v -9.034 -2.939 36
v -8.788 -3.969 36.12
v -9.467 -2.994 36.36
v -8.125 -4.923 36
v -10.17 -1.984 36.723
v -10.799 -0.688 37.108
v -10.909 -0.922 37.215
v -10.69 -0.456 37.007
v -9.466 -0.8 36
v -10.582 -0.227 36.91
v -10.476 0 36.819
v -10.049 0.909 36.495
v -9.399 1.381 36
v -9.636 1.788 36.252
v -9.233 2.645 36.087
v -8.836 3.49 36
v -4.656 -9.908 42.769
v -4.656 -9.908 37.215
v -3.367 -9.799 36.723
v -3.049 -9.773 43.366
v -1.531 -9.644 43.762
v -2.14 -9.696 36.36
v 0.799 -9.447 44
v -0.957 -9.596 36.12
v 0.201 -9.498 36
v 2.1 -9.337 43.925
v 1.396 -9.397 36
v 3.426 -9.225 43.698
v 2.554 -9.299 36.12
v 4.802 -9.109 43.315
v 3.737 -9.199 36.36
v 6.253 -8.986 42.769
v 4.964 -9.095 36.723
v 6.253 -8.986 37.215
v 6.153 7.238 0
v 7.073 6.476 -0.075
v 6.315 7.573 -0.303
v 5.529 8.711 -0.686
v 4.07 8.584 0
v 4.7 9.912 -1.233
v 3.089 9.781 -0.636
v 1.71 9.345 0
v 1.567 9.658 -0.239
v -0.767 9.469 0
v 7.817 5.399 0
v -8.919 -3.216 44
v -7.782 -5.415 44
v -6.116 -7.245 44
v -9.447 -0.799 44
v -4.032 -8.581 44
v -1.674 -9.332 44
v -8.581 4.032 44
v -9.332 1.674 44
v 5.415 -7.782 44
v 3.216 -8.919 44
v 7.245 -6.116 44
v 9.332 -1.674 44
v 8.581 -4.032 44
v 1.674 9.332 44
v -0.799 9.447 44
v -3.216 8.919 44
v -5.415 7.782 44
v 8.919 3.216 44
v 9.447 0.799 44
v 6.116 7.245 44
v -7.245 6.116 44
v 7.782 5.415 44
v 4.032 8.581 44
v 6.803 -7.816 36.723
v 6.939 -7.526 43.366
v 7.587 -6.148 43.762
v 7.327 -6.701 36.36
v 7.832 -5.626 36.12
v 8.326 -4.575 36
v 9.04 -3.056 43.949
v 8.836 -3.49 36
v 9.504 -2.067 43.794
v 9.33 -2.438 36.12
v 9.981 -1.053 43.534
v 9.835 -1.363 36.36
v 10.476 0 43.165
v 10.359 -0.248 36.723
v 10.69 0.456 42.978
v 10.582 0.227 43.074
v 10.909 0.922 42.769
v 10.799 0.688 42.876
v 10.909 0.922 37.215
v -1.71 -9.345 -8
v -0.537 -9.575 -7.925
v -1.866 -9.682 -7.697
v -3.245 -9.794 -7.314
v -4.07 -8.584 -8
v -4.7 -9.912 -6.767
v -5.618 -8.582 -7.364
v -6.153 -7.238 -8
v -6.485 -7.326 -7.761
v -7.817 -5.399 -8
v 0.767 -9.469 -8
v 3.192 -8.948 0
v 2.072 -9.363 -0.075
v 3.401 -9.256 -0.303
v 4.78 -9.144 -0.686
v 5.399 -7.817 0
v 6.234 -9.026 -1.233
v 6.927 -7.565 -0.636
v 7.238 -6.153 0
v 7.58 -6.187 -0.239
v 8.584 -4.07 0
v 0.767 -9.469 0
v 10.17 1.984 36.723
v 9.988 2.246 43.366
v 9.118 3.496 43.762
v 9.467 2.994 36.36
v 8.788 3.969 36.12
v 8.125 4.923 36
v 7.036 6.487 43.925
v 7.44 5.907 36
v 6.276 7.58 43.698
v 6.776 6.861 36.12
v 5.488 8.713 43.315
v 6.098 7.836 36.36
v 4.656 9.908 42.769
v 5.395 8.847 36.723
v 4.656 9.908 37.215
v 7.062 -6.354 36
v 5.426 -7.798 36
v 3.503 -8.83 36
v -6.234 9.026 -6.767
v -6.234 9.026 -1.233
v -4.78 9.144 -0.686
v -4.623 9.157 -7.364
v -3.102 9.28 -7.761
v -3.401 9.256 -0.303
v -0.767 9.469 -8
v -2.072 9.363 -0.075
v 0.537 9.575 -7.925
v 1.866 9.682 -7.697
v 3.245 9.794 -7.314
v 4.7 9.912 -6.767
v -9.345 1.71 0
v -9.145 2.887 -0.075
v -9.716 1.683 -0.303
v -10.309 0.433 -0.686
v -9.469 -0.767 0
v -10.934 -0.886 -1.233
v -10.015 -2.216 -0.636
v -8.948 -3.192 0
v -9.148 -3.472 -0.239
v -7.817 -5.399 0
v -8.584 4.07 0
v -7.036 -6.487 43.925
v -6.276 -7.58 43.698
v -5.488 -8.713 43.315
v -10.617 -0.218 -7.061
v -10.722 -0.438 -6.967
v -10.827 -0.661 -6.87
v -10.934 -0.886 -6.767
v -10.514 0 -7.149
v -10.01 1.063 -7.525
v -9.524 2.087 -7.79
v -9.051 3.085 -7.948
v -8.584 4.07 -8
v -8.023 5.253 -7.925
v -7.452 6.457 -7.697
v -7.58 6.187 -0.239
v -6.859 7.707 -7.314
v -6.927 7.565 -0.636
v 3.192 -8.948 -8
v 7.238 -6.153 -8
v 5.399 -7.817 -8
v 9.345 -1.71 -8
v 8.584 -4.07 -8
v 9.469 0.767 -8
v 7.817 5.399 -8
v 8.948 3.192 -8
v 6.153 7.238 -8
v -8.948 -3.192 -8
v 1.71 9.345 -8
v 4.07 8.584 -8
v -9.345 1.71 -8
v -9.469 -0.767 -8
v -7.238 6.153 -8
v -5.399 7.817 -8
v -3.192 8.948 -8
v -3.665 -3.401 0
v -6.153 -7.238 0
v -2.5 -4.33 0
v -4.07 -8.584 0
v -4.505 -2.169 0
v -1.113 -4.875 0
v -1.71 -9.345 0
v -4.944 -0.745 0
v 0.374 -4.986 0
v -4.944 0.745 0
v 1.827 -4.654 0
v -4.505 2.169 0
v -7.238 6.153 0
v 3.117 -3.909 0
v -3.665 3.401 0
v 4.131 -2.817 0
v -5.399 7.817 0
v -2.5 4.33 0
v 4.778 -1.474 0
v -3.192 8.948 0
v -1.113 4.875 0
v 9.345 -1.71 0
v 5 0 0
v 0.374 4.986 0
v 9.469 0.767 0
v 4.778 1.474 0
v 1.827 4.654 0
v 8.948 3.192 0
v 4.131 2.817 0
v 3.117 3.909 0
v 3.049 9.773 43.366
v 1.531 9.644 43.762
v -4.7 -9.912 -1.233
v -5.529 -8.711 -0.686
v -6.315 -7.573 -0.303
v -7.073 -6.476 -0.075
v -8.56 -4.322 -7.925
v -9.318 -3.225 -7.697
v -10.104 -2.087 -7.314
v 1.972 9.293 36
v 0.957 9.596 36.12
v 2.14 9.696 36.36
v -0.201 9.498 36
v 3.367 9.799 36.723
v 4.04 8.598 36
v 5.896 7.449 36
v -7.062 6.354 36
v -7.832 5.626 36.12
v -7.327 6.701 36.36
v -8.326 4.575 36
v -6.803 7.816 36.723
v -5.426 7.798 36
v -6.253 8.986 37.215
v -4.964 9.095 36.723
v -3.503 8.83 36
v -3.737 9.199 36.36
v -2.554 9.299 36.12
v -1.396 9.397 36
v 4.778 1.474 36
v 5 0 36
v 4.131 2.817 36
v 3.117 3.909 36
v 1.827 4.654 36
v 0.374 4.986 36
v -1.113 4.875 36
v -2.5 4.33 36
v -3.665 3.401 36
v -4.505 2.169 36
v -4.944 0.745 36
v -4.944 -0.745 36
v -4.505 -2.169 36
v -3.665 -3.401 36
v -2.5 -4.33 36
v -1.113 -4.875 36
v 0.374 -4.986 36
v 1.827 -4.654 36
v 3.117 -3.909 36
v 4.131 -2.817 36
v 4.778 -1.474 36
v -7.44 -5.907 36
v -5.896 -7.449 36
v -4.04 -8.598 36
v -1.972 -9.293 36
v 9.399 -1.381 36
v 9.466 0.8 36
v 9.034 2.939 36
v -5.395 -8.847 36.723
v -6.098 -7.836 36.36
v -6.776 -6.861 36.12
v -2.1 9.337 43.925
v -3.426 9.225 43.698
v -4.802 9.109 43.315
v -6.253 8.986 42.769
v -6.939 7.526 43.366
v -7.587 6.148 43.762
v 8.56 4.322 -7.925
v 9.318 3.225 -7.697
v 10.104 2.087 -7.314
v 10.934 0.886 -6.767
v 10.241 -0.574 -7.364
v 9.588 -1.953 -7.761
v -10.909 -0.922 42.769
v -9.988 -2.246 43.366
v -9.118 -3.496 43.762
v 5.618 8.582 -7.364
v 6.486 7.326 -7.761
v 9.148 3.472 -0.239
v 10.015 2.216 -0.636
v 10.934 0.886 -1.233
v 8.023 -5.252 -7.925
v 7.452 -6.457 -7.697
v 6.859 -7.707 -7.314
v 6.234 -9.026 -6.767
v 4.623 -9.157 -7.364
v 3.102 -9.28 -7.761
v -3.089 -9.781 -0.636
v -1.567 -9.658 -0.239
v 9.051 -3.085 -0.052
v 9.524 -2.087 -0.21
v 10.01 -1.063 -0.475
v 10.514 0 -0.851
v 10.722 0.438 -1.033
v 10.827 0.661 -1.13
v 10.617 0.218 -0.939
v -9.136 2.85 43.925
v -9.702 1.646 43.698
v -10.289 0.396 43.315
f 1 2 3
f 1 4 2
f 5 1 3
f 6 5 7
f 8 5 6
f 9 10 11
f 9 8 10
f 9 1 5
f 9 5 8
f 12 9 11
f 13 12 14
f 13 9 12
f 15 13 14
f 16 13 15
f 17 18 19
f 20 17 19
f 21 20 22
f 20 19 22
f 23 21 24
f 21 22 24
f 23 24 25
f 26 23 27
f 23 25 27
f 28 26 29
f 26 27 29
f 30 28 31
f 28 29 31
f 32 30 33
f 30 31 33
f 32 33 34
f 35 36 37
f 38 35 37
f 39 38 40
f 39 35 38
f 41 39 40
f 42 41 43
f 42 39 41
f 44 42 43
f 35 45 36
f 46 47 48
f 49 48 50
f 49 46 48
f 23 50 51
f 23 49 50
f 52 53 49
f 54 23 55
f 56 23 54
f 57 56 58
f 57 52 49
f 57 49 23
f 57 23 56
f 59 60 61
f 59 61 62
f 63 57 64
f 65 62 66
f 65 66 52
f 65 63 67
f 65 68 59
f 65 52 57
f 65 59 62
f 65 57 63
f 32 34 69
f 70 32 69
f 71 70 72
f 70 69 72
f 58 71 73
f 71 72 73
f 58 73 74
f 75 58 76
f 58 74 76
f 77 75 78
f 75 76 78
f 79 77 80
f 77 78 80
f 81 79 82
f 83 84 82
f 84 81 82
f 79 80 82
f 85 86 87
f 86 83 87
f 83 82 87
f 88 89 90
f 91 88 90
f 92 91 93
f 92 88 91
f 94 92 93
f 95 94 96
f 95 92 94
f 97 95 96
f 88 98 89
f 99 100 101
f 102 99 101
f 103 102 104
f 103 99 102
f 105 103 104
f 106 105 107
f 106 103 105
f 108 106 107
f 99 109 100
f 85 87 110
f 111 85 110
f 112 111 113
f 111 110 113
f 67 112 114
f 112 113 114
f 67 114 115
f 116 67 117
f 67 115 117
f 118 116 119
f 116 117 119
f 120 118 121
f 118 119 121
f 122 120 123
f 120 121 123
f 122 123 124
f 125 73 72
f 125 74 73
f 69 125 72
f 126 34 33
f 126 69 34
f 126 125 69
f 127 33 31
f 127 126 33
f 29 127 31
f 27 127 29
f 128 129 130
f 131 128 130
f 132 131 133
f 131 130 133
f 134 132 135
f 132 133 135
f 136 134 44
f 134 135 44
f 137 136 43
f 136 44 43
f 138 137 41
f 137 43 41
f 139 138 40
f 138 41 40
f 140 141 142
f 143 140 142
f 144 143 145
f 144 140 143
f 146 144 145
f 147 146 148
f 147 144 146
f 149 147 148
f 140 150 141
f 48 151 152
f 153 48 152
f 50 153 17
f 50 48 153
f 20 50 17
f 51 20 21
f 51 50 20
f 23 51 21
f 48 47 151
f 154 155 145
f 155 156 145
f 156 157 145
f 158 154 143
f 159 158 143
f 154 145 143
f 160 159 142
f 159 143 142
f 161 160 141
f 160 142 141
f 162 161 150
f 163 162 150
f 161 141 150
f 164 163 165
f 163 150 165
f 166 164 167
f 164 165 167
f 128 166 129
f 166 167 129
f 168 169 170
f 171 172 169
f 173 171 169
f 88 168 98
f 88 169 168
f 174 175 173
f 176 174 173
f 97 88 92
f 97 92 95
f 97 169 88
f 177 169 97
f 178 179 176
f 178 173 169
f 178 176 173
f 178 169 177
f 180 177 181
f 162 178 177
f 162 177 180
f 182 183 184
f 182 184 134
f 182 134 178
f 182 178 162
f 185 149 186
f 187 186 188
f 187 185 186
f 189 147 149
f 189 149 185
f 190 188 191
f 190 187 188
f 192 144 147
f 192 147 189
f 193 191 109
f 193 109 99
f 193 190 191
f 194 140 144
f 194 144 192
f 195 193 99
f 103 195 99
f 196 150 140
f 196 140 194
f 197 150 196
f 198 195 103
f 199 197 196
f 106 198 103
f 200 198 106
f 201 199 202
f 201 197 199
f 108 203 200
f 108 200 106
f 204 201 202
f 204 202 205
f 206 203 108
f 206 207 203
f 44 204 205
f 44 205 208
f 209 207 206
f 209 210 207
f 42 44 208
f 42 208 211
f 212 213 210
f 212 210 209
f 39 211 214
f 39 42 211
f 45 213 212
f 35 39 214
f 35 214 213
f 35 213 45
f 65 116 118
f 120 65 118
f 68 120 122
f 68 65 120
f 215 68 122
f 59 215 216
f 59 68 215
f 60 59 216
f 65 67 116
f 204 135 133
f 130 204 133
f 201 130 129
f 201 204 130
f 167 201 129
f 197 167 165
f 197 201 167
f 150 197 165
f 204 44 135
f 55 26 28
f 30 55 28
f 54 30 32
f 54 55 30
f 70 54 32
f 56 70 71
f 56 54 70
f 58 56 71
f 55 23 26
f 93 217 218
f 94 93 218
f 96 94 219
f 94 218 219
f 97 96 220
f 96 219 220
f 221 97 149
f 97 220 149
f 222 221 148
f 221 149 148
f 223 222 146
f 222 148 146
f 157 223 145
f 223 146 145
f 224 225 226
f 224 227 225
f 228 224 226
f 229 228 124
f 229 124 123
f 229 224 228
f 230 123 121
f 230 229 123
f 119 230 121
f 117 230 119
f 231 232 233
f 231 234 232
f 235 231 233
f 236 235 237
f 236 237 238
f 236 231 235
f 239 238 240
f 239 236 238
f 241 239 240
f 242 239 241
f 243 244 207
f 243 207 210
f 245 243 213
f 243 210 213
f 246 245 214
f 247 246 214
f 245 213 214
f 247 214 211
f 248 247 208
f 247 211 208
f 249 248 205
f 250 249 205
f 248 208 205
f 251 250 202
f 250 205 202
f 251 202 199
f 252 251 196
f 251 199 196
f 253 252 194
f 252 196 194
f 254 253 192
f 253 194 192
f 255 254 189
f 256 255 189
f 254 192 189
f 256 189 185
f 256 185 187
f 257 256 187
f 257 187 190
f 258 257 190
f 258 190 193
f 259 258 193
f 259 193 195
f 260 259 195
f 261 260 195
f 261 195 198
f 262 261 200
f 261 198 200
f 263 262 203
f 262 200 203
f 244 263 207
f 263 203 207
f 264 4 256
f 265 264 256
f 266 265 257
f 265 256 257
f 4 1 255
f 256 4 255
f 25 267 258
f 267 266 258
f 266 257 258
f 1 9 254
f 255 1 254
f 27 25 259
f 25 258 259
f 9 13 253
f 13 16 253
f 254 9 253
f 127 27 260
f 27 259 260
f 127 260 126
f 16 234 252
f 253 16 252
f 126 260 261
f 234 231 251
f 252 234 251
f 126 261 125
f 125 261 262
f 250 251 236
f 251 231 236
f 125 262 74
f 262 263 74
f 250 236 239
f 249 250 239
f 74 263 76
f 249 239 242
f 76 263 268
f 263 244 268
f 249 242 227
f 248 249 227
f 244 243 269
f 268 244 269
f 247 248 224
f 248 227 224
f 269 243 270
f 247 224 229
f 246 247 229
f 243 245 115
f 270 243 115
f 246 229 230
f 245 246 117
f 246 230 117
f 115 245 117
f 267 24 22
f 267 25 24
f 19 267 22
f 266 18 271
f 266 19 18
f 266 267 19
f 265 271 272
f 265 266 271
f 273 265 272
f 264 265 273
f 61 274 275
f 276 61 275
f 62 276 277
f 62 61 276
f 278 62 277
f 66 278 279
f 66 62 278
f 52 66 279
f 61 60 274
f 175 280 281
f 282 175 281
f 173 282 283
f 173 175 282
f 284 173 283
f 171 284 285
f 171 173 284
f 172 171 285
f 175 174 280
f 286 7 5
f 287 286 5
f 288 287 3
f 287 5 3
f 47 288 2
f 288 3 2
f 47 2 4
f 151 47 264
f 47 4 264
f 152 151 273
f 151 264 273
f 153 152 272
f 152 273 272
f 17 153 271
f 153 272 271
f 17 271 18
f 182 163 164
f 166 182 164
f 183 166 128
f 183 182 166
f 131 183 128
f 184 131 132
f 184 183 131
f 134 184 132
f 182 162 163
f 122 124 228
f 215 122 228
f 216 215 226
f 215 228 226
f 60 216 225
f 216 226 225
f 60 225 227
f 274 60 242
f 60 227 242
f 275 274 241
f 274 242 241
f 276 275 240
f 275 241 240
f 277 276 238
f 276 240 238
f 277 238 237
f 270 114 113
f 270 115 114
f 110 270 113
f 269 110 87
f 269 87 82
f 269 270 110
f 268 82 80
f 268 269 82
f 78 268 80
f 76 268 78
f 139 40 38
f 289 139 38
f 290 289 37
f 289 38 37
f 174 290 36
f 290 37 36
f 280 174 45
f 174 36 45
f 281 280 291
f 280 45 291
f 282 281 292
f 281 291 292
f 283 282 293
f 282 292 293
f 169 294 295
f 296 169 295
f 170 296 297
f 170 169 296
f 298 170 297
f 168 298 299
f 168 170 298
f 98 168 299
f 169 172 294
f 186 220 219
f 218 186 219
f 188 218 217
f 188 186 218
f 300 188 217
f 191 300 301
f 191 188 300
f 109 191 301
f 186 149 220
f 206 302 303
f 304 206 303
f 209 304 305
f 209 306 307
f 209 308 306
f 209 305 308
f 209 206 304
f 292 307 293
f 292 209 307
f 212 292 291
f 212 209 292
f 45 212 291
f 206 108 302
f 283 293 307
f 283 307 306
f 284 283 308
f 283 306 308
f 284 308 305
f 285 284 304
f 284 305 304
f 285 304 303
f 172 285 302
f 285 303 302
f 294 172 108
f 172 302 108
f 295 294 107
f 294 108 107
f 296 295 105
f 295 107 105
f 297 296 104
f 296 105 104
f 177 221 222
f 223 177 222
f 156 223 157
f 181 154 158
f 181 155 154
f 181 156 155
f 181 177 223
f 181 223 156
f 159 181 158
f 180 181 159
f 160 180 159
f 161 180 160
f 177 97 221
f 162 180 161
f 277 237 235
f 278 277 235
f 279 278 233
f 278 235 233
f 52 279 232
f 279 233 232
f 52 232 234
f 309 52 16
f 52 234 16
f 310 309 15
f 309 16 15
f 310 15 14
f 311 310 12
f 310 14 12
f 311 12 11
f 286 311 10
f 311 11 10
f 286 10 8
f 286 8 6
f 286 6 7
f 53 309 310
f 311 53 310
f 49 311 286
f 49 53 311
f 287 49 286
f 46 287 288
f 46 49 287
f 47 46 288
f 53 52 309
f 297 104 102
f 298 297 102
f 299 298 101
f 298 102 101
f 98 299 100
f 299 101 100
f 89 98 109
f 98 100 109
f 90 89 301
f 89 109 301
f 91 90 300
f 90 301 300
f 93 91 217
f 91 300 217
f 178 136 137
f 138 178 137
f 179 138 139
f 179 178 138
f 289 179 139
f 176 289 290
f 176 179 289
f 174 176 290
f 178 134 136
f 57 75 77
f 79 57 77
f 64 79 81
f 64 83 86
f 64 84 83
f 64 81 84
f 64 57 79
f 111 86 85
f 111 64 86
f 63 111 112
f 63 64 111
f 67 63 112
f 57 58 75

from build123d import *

# Parameters (mm, degrees)
SKETCH1_R           = 6
BOSS_EXTRUDE1_DEPTH = 36
BOSS_EXTRUDE2_DEPTH = 8
SKETCH3_OUTSIDE_W   = 53.532
SKETCH3_OUTSIDE_H   = 51.488
SKETCH3_OUTSIDE_R   = 9.5
CUT_EXTRUDE1_DEPTH  = 8
CUT_EXTRUDE1_DRAFT  = -50
SKETCH4_OUTSIDE_W   = 53.532
SKETCH4_OUTSIDE_H   = 51.488
SKETCH4_OUTSIDE_R   = 9.5
CUT_EXTRUDE3_DEPTH  = 8
CUT_EXTRUDE3_DRAFT  = -50
BOSS_EXTRUDE3_DEPTH = 8
SKETCH6_OUTSIDE_W   = 54.894
SKETCH6_OUTSIDE_H   = 52.85
SKETCH6_OUTSIDE_R   = 9.5
CUT_EXTRUDE6_DEPTH  = 8
CUT_EXTRUDE6_DRAFT  = -50
SKETCH7_OUTSIDE_W   = 54.894
SKETCH7_OUTSIDE_H   = 52.85
SKETCH7_OUTSIDE_R   = 9.481063721
CUT_EXTRUDE7_DEPTH  = 8
CUT_EXTRUDE7_DRAFT  = -50
SKETCH8_R           = 6
SKETCH8_R_2         = 5
CUT_EXTRUDE8_DEPTH  = 36


with BuildPart() as part:
    # Sketch1 → Boss-Extrude1 (new body)
    with BuildSketch(Plane.XY):
        Circle(SKETCH1_R)
    extrude(amount=BOSS_EXTRUDE1_DEPTH)

    # Sketch2 → Boss-Extrude2 (add)
    with BuildSketch(Plane(origin=(0, 0, 0), x_dir=(-1, 0, 0), z_dir=(0, 0, -1))):
        Polygon((-10.93381737, 0.885985919), (-6.234194998, -9.025970644), (4.699622372, -9.911956562), (10.93381737, -0.885985919), (6.234194998, 9.025970644), (-4.699622372, 9.911956562), align=None)
    extrude(amount=BOSS_EXTRUDE2_DEPTH)


with BuildPart() as cut_extrude1_tool:
    # Sketch3 outside → Cut-Extrude1 (with draft: the straight prism first)
    with BuildSketch(Plane.XY):
        Rectangle(SKETCH3_OUTSIDE_W, SKETCH3_OUTSIDE_H)
        Circle(SKETCH3_OUTSIDE_R, mode=Mode.SUBTRACT)
    extrude(amount=-CUT_EXTRUDE1_DEPTH)
    # Cut-Extrude1: the draft: its side faces are tilted about the plane it starts from
    cut_extrude1_sides = [cut_extrude1_tool.faces().sort_by_distance(p)[0] for p in [
        (0, -25.744, -4),
        (26.766, 0, -4),
        (0, 25.744, -4),
        (-26.766, 0, -4),
        (-9.5, 0, -4),
    ]]
    draft(cut_extrude1_sides, Plane.XY, CUT_EXTRUDE1_DRAFT)


with BuildPart() as part_1:
    add(part.part)

    # Cut-Extrude1: cut by cut_extrude1_tool
    add(cut_extrude1_tool.part, mode=Mode.SUBTRACT)


with BuildPart() as cut_extrude3_tool:
    # Sketch4 outside → Cut-Extrude3 (with draft: the straight prism first)
    with BuildSketch(Plane(origin=(0, 0, -8), x_dir=(-1, 0, 0), z_dir=(0, 0, -1))):
        Rectangle(SKETCH4_OUTSIDE_W, SKETCH4_OUTSIDE_H)
        Circle(SKETCH4_OUTSIDE_R, mode=Mode.SUBTRACT)
    extrude(amount=-CUT_EXTRUDE3_DEPTH)
    # Cut-Extrude3: the draft: its side faces are tilted about the plane it starts from
    cut_extrude3_sides = [cut_extrude3_tool.faces().sort_by_distance(p)[0] for p in [
        (0, -25.744, -4),
        (-26.766, 0, -4),
        (0, 25.744, -4),
        (26.766, 0, -4),
        (9.5, 0, -4),
    ]]
    draft(cut_extrude3_sides, Plane(origin=(0, 0, -8), x_dir=(-1, 0, 0), z_dir=(0, 0, -1)), CUT_EXTRUDE3_DRAFT)


with BuildPart() as part_2:
    add(part_1.part)

    # Cut-Extrude3: cut by cut_extrude3_tool
    add(cut_extrude3_tool.part, mode=Mode.SUBTRACT)

    # Sketch5 → Boss-Extrude3 (add)
    with BuildSketch(Plane.XY.offset(36)):
        Polygon((-6.252986911, 8.986336688), (-10.908889314, -0.92207717), (-4.655902404, -9.908413858), (6.252986911, -8.986336688), (10.908889314, 0.92207717), (4.655902404, 9.908413858), align=None)
    extrude(amount=BOSS_EXTRUDE3_DEPTH)


with BuildPart() as cut_extrude6_tool:
    # Sketch6 outside → Cut-Extrude6 (with draft: the straight prism first)
    with BuildSketch(Plane(origin=(0, 0, 36), x_dir=(-1, 0, 0), z_dir=(0, 0, -1))):
        Rectangle(SKETCH6_OUTSIDE_W, SKETCH6_OUTSIDE_H)
        Circle(SKETCH6_OUTSIDE_R, mode=Mode.SUBTRACT)
    extrude(amount=-CUT_EXTRUDE6_DEPTH)
    # Cut-Extrude6: the draft: its side faces are tilted about the plane it starts from
    cut_extrude6_sides = [cut_extrude6_tool.faces().sort_by_distance(p)[0] for p in [
        (0, -26.425, 40),
        (-27.447, 0, 40),
        (0, 26.425, 40),
        (27.447, 0, 40),
        (9.5, 0, 40),
    ]]
    draft(cut_extrude6_sides, Plane(origin=(0, 0, 36), x_dir=(-1, 0, 0), z_dir=(0, 0, -1)), CUT_EXTRUDE6_DRAFT)


with BuildPart() as part_3:
    add(part_2.part)

    # Cut-Extrude6: cut by cut_extrude6_tool
    add(cut_extrude6_tool.part, mode=Mode.SUBTRACT)


with BuildPart() as cut_extrude7_tool:
    # Sketch7 outside → Cut-Extrude7 (with draft: the straight prism first)
    with BuildSketch(Plane.XY.offset(44)):
        Rectangle(SKETCH7_OUTSIDE_W, SKETCH7_OUTSIDE_H)
        Circle(SKETCH7_OUTSIDE_R, mode=Mode.SUBTRACT)
    extrude(amount=-CUT_EXTRUDE7_DEPTH)
    # Cut-Extrude7: the draft: its side faces are tilted about the plane it starts from
    cut_extrude7_sides = [cut_extrude7_tool.faces().sort_by_distance(p)[0] for p in [
        (0, -26.425, 40),
        (27.447, 0, 40),
        (0, 26.425, 40),
        (-27.447, 0, 40),
        (-9.481063721, 0, 40),
    ]]
    draft(cut_extrude7_sides, Plane.XY.offset(44), CUT_EXTRUDE7_DRAFT)


with BuildPart() as part_4:
    add(part_3.part)

    # Cut-Extrude7: cut by cut_extrude7_tool
    add(cut_extrude7_tool.part, mode=Mode.SUBTRACT)

    # Sketch8 → Cut-Extrude8 (cut)
    with BuildSketch(Plane.XY):
        Circle(SKETCH8_R)
        Circle(SKETCH8_R_2, mode=Mode.SUBTRACT)
    extrude(amount=CUT_EXTRUDE8_DEPTH, mode=Mode.SUBTRACT)


solid = part_4.part
